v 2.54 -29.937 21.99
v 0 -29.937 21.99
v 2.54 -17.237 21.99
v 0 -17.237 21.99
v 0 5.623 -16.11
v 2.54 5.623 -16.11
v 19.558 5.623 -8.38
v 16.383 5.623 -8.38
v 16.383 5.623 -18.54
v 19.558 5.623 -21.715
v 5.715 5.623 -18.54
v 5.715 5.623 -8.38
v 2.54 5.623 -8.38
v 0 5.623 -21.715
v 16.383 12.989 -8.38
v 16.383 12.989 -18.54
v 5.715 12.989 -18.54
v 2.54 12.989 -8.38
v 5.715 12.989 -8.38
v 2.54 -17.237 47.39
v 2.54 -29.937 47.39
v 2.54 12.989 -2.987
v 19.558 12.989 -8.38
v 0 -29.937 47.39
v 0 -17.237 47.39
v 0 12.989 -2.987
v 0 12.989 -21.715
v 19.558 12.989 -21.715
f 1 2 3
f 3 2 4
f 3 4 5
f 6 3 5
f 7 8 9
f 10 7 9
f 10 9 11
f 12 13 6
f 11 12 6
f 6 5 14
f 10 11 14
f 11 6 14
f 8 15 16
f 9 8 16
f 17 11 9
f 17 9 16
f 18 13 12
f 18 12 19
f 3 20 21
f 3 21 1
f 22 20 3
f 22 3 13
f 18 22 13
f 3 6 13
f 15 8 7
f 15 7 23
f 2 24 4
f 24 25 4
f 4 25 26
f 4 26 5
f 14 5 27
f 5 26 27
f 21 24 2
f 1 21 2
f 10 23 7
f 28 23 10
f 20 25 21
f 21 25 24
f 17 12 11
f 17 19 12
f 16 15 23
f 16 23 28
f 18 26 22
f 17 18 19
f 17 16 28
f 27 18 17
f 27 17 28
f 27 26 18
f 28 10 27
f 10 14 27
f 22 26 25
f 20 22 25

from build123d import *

# Parameters (mm, degrees)
BOSS_EXTRUDE1_DEPTH = 2.54
SKETCH2_W           = 3.175
SKETCH2_H           = 7.366
BOSS_EXTRUDE2_DEPTH = 3.175
SKETCH3_W           = 3.175
SKETCH3_H           = 7.366
BOSS_EXTRUDE4_DEPTH = 10.668
SKETCH4_W           = 13.335
SKETCH4_H           = 7.366
BOSS_EXTRUDE5_DEPTH = 3.175


with BuildPart() as part:
    # Sketch1 → Boss-Extrude1 (new body)
    with BuildSketch(Plane(origin=(0, 0, 0), x_dir=(0, 0, -1), z_dir=(1, 0, 0))):
        Polygon((-47.389657734, -29.937142578), (-21.989657734, -29.937142578), (-21.989657734, -17.237142578), (16.110342266, 5.622857422), (21.714787013, 5.622857422), (21.714787013, 12.988857422), (2.987008932, 12.988857422), (-47.389657734, -17.237142578), align=None)
    extrude(amount=BOSS_EXTRUDE1_DEPTH)

    # Sketch2 → Boss-Extrude2 (add)
    with BuildSketch(Plane(origin=(2.54, 0, 0), x_dir=(0, 0, -1), z_dir=(1, 0, 0))):
        Polygon((16.110342266, 5.622857422), (21.714787013, 5.622857422), (21.714787013, 12.988857422), (11.554787013, 12.988857422), (11.554787013, 5.622857422), align=None)
        with Locations((9.967287013, 9.305857422)):
            Rectangle(SKETCH2_W, SKETCH2_H)
    extrude(amount=BOSS_EXTRUDE2_DEPTH)

    # Sketch3 → Boss-Extrude4 (add)
    with BuildSketch(Plane(origin=(5.715, 0, 0), x_dir=(0, 0, -1), z_dir=(1, 0, 0))):
        with Locations((20.127287013, 9.305857422)):
            Rectangle(SKETCH3_W, SKETCH3_H)
    extrude(amount=BOSS_EXTRUDE4_DEPTH)

    # Sketch4 → Boss-Extrude5 (add)
    with BuildSketch(Plane(origin=(16.383, 0, 0), x_dir=(0, 0, -1), z_dir=(1, 0, 0))):
        with Locations((15.047287013, 9.305857422)):
            Rectangle(SKETCH4_W, SKETCH4_H)
    extrude(amount=BOSS_EXTRUDE5_DEPTH)


solid = part.part
